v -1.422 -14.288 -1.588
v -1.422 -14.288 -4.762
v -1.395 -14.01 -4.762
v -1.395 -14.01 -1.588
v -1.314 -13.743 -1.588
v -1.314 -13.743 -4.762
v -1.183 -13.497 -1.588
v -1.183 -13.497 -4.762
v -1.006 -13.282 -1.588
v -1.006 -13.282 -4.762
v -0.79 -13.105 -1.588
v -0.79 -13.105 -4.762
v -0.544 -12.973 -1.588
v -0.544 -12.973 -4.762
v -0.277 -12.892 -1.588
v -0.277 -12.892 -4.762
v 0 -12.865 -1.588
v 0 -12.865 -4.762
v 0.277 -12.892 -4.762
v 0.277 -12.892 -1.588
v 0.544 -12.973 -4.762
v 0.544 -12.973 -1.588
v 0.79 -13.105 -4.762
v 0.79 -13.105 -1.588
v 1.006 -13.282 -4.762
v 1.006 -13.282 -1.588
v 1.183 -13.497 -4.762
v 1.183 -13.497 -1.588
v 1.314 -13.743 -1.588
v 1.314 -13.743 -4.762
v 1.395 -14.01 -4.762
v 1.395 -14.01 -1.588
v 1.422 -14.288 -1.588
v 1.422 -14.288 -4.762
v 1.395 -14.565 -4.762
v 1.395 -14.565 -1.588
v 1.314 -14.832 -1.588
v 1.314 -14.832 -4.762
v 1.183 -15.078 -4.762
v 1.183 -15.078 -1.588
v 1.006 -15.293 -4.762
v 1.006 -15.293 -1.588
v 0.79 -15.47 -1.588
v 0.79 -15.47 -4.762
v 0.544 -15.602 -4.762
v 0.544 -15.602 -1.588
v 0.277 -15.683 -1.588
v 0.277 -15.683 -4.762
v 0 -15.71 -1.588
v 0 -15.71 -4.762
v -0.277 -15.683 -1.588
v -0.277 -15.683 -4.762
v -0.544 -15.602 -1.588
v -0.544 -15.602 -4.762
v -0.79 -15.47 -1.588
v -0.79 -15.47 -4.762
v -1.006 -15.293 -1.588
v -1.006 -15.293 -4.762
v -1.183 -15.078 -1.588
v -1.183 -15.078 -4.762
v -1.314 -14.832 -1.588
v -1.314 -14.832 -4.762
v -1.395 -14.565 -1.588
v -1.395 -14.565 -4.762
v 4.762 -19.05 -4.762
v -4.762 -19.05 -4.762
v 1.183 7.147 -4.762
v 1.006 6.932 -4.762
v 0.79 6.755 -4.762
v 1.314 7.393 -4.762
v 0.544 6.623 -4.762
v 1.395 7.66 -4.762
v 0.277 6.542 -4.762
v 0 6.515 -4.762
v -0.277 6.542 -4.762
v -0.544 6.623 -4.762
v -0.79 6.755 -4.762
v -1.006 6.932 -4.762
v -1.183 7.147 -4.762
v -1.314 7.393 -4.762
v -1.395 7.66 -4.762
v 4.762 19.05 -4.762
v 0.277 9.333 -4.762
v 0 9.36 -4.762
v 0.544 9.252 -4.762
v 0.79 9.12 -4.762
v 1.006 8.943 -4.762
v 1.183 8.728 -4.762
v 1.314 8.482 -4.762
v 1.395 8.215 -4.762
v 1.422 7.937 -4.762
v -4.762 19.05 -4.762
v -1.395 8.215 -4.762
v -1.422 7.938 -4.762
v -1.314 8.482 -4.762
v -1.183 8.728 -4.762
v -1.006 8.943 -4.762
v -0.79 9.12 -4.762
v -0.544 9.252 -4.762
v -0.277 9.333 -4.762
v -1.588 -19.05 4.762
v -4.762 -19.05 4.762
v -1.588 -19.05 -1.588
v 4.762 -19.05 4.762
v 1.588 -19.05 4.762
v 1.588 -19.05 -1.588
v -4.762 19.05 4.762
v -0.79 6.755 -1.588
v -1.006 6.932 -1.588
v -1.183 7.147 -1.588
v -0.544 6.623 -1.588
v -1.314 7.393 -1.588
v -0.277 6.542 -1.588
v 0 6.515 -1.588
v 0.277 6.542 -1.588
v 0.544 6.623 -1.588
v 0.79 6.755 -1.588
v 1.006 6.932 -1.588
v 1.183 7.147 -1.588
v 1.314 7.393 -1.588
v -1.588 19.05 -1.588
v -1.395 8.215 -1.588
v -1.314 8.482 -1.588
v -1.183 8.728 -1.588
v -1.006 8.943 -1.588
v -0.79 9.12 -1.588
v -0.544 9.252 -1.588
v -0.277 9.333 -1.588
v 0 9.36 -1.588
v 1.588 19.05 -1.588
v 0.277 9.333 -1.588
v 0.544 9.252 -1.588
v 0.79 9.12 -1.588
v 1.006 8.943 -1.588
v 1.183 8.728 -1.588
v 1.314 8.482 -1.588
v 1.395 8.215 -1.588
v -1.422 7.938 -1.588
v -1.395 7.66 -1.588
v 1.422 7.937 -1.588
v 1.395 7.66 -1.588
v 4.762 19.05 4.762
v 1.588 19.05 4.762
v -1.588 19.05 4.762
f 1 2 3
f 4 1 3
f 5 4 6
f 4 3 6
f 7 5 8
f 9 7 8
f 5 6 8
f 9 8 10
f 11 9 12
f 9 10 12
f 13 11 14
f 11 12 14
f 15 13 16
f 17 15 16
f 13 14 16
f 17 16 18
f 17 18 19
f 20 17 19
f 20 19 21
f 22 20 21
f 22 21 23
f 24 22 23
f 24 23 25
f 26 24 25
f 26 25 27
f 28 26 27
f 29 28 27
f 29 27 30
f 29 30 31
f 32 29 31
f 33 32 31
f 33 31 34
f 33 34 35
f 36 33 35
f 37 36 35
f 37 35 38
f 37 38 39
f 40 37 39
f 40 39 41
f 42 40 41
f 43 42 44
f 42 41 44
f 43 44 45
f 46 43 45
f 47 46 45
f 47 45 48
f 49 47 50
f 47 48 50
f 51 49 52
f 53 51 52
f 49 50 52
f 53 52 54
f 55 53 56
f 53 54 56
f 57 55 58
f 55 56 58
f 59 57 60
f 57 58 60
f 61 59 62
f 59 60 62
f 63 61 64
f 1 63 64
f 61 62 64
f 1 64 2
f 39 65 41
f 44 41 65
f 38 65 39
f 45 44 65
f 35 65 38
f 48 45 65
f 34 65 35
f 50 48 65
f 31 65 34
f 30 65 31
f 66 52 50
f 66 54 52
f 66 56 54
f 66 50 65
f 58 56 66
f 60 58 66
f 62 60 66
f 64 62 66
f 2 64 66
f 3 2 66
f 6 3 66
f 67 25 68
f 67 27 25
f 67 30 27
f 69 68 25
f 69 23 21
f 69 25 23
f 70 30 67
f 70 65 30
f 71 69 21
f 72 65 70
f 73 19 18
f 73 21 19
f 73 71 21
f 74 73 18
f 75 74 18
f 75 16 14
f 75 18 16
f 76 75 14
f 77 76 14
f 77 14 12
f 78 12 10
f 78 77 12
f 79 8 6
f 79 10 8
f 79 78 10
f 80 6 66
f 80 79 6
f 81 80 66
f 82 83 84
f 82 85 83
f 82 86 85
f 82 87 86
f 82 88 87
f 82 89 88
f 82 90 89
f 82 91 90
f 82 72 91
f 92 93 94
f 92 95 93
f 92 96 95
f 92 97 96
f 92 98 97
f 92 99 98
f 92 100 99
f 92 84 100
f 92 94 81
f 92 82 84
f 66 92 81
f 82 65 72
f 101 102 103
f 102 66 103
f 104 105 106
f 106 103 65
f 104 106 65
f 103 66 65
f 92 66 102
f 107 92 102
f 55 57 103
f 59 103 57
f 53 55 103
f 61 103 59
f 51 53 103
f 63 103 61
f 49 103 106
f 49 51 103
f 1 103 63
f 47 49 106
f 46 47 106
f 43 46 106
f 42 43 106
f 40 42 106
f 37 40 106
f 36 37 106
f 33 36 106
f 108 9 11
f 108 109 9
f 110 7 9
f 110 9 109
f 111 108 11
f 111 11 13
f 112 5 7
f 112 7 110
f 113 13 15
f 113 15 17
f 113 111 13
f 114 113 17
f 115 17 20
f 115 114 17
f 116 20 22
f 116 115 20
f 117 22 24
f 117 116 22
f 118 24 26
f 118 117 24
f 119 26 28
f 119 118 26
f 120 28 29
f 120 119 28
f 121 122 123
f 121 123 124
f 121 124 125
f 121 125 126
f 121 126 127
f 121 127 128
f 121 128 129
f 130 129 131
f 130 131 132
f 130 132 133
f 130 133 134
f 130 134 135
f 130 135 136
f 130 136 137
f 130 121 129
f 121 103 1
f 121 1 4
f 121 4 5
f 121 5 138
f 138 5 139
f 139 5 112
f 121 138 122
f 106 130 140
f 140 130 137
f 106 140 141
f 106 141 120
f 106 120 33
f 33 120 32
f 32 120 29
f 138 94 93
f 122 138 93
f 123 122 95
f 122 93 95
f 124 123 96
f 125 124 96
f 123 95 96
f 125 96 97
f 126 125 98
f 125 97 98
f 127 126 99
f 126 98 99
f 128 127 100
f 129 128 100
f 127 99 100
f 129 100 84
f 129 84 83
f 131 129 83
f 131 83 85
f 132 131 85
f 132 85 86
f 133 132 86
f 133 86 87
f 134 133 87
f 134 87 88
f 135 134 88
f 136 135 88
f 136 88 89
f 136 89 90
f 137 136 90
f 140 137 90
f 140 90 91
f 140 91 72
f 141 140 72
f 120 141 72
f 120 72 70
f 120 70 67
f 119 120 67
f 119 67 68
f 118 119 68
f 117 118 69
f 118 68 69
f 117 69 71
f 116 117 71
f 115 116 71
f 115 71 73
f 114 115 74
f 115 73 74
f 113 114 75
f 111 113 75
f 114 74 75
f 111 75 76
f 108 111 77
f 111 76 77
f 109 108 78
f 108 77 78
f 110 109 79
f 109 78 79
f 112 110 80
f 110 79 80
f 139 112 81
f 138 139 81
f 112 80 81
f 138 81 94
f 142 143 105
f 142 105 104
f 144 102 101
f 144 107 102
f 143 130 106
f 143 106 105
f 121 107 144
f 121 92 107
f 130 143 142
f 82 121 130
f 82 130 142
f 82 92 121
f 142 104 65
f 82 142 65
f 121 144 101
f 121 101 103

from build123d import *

# Parameters (mm, degrees)
EXTRUDE1_DEPTH                  = 19.05
F_4_40_TAPPED_HOLE1_D           = 2.2606
F_4_40_TAPPED_HOLE1_DEPTH       = 8.89
F_4_40_TAPPED_HOLE1_CBORE_D     = 2.8448
F_4_40_TAPPED_HOLE1_CBORE_DEPTH = 5.588
F_4_40_TAPPED_HOLE1_TIP         = 0.679152758


with BuildPart() as part:
    # Sketch1 → Extrude1 (new body, symmetric)
    with BuildSketch(Plane(origin=(0, 0, 0), x_dir=(1, 0, 0), z_dir=(0, 1, 0))):
        Polygon((-4.7625, -4.7625), (-1.5875, -4.7625), (-1.5875, 1.5875), (1.5875, 1.5875), (1.5875, -4.7625), (4.7625, -4.7625), (4.7625, 4.7625), (-4.7625, 4.7625), align=None)
    extrude(amount=EXTRUDE1_DEPTH, both=True)

    # #4-40 Tapped Hole1
    with Locations(Plane(origin=(0, 7.9375, -4.7625), x_dir=(-1, 0, 0), z_dir=(0, 0, -1))):
        with Locations((0, 0), (0, -22.225)):
            CounterBoreHole(F_4_40_TAPPED_HOLE1_D / 2, F_4_40_TAPPED_HOLE1_CBORE_D / 2, F_4_40_TAPPED_HOLE1_CBORE_DEPTH, depth=F_4_40_TAPPED_HOLE1_DEPTH)
            with Locations((0, 0, -(F_4_40_TAPPED_HOLE1_DEPTH + F_4_40_TAPPED_HOLE1_TIP / 2))):  # 118° drill point
                Cone(0, F_4_40_TAPPED_HOLE1_D / 2, F_4_40_TAPPED_HOLE1_TIP, mode=Mode.SUBTRACT)


solid = part.part
